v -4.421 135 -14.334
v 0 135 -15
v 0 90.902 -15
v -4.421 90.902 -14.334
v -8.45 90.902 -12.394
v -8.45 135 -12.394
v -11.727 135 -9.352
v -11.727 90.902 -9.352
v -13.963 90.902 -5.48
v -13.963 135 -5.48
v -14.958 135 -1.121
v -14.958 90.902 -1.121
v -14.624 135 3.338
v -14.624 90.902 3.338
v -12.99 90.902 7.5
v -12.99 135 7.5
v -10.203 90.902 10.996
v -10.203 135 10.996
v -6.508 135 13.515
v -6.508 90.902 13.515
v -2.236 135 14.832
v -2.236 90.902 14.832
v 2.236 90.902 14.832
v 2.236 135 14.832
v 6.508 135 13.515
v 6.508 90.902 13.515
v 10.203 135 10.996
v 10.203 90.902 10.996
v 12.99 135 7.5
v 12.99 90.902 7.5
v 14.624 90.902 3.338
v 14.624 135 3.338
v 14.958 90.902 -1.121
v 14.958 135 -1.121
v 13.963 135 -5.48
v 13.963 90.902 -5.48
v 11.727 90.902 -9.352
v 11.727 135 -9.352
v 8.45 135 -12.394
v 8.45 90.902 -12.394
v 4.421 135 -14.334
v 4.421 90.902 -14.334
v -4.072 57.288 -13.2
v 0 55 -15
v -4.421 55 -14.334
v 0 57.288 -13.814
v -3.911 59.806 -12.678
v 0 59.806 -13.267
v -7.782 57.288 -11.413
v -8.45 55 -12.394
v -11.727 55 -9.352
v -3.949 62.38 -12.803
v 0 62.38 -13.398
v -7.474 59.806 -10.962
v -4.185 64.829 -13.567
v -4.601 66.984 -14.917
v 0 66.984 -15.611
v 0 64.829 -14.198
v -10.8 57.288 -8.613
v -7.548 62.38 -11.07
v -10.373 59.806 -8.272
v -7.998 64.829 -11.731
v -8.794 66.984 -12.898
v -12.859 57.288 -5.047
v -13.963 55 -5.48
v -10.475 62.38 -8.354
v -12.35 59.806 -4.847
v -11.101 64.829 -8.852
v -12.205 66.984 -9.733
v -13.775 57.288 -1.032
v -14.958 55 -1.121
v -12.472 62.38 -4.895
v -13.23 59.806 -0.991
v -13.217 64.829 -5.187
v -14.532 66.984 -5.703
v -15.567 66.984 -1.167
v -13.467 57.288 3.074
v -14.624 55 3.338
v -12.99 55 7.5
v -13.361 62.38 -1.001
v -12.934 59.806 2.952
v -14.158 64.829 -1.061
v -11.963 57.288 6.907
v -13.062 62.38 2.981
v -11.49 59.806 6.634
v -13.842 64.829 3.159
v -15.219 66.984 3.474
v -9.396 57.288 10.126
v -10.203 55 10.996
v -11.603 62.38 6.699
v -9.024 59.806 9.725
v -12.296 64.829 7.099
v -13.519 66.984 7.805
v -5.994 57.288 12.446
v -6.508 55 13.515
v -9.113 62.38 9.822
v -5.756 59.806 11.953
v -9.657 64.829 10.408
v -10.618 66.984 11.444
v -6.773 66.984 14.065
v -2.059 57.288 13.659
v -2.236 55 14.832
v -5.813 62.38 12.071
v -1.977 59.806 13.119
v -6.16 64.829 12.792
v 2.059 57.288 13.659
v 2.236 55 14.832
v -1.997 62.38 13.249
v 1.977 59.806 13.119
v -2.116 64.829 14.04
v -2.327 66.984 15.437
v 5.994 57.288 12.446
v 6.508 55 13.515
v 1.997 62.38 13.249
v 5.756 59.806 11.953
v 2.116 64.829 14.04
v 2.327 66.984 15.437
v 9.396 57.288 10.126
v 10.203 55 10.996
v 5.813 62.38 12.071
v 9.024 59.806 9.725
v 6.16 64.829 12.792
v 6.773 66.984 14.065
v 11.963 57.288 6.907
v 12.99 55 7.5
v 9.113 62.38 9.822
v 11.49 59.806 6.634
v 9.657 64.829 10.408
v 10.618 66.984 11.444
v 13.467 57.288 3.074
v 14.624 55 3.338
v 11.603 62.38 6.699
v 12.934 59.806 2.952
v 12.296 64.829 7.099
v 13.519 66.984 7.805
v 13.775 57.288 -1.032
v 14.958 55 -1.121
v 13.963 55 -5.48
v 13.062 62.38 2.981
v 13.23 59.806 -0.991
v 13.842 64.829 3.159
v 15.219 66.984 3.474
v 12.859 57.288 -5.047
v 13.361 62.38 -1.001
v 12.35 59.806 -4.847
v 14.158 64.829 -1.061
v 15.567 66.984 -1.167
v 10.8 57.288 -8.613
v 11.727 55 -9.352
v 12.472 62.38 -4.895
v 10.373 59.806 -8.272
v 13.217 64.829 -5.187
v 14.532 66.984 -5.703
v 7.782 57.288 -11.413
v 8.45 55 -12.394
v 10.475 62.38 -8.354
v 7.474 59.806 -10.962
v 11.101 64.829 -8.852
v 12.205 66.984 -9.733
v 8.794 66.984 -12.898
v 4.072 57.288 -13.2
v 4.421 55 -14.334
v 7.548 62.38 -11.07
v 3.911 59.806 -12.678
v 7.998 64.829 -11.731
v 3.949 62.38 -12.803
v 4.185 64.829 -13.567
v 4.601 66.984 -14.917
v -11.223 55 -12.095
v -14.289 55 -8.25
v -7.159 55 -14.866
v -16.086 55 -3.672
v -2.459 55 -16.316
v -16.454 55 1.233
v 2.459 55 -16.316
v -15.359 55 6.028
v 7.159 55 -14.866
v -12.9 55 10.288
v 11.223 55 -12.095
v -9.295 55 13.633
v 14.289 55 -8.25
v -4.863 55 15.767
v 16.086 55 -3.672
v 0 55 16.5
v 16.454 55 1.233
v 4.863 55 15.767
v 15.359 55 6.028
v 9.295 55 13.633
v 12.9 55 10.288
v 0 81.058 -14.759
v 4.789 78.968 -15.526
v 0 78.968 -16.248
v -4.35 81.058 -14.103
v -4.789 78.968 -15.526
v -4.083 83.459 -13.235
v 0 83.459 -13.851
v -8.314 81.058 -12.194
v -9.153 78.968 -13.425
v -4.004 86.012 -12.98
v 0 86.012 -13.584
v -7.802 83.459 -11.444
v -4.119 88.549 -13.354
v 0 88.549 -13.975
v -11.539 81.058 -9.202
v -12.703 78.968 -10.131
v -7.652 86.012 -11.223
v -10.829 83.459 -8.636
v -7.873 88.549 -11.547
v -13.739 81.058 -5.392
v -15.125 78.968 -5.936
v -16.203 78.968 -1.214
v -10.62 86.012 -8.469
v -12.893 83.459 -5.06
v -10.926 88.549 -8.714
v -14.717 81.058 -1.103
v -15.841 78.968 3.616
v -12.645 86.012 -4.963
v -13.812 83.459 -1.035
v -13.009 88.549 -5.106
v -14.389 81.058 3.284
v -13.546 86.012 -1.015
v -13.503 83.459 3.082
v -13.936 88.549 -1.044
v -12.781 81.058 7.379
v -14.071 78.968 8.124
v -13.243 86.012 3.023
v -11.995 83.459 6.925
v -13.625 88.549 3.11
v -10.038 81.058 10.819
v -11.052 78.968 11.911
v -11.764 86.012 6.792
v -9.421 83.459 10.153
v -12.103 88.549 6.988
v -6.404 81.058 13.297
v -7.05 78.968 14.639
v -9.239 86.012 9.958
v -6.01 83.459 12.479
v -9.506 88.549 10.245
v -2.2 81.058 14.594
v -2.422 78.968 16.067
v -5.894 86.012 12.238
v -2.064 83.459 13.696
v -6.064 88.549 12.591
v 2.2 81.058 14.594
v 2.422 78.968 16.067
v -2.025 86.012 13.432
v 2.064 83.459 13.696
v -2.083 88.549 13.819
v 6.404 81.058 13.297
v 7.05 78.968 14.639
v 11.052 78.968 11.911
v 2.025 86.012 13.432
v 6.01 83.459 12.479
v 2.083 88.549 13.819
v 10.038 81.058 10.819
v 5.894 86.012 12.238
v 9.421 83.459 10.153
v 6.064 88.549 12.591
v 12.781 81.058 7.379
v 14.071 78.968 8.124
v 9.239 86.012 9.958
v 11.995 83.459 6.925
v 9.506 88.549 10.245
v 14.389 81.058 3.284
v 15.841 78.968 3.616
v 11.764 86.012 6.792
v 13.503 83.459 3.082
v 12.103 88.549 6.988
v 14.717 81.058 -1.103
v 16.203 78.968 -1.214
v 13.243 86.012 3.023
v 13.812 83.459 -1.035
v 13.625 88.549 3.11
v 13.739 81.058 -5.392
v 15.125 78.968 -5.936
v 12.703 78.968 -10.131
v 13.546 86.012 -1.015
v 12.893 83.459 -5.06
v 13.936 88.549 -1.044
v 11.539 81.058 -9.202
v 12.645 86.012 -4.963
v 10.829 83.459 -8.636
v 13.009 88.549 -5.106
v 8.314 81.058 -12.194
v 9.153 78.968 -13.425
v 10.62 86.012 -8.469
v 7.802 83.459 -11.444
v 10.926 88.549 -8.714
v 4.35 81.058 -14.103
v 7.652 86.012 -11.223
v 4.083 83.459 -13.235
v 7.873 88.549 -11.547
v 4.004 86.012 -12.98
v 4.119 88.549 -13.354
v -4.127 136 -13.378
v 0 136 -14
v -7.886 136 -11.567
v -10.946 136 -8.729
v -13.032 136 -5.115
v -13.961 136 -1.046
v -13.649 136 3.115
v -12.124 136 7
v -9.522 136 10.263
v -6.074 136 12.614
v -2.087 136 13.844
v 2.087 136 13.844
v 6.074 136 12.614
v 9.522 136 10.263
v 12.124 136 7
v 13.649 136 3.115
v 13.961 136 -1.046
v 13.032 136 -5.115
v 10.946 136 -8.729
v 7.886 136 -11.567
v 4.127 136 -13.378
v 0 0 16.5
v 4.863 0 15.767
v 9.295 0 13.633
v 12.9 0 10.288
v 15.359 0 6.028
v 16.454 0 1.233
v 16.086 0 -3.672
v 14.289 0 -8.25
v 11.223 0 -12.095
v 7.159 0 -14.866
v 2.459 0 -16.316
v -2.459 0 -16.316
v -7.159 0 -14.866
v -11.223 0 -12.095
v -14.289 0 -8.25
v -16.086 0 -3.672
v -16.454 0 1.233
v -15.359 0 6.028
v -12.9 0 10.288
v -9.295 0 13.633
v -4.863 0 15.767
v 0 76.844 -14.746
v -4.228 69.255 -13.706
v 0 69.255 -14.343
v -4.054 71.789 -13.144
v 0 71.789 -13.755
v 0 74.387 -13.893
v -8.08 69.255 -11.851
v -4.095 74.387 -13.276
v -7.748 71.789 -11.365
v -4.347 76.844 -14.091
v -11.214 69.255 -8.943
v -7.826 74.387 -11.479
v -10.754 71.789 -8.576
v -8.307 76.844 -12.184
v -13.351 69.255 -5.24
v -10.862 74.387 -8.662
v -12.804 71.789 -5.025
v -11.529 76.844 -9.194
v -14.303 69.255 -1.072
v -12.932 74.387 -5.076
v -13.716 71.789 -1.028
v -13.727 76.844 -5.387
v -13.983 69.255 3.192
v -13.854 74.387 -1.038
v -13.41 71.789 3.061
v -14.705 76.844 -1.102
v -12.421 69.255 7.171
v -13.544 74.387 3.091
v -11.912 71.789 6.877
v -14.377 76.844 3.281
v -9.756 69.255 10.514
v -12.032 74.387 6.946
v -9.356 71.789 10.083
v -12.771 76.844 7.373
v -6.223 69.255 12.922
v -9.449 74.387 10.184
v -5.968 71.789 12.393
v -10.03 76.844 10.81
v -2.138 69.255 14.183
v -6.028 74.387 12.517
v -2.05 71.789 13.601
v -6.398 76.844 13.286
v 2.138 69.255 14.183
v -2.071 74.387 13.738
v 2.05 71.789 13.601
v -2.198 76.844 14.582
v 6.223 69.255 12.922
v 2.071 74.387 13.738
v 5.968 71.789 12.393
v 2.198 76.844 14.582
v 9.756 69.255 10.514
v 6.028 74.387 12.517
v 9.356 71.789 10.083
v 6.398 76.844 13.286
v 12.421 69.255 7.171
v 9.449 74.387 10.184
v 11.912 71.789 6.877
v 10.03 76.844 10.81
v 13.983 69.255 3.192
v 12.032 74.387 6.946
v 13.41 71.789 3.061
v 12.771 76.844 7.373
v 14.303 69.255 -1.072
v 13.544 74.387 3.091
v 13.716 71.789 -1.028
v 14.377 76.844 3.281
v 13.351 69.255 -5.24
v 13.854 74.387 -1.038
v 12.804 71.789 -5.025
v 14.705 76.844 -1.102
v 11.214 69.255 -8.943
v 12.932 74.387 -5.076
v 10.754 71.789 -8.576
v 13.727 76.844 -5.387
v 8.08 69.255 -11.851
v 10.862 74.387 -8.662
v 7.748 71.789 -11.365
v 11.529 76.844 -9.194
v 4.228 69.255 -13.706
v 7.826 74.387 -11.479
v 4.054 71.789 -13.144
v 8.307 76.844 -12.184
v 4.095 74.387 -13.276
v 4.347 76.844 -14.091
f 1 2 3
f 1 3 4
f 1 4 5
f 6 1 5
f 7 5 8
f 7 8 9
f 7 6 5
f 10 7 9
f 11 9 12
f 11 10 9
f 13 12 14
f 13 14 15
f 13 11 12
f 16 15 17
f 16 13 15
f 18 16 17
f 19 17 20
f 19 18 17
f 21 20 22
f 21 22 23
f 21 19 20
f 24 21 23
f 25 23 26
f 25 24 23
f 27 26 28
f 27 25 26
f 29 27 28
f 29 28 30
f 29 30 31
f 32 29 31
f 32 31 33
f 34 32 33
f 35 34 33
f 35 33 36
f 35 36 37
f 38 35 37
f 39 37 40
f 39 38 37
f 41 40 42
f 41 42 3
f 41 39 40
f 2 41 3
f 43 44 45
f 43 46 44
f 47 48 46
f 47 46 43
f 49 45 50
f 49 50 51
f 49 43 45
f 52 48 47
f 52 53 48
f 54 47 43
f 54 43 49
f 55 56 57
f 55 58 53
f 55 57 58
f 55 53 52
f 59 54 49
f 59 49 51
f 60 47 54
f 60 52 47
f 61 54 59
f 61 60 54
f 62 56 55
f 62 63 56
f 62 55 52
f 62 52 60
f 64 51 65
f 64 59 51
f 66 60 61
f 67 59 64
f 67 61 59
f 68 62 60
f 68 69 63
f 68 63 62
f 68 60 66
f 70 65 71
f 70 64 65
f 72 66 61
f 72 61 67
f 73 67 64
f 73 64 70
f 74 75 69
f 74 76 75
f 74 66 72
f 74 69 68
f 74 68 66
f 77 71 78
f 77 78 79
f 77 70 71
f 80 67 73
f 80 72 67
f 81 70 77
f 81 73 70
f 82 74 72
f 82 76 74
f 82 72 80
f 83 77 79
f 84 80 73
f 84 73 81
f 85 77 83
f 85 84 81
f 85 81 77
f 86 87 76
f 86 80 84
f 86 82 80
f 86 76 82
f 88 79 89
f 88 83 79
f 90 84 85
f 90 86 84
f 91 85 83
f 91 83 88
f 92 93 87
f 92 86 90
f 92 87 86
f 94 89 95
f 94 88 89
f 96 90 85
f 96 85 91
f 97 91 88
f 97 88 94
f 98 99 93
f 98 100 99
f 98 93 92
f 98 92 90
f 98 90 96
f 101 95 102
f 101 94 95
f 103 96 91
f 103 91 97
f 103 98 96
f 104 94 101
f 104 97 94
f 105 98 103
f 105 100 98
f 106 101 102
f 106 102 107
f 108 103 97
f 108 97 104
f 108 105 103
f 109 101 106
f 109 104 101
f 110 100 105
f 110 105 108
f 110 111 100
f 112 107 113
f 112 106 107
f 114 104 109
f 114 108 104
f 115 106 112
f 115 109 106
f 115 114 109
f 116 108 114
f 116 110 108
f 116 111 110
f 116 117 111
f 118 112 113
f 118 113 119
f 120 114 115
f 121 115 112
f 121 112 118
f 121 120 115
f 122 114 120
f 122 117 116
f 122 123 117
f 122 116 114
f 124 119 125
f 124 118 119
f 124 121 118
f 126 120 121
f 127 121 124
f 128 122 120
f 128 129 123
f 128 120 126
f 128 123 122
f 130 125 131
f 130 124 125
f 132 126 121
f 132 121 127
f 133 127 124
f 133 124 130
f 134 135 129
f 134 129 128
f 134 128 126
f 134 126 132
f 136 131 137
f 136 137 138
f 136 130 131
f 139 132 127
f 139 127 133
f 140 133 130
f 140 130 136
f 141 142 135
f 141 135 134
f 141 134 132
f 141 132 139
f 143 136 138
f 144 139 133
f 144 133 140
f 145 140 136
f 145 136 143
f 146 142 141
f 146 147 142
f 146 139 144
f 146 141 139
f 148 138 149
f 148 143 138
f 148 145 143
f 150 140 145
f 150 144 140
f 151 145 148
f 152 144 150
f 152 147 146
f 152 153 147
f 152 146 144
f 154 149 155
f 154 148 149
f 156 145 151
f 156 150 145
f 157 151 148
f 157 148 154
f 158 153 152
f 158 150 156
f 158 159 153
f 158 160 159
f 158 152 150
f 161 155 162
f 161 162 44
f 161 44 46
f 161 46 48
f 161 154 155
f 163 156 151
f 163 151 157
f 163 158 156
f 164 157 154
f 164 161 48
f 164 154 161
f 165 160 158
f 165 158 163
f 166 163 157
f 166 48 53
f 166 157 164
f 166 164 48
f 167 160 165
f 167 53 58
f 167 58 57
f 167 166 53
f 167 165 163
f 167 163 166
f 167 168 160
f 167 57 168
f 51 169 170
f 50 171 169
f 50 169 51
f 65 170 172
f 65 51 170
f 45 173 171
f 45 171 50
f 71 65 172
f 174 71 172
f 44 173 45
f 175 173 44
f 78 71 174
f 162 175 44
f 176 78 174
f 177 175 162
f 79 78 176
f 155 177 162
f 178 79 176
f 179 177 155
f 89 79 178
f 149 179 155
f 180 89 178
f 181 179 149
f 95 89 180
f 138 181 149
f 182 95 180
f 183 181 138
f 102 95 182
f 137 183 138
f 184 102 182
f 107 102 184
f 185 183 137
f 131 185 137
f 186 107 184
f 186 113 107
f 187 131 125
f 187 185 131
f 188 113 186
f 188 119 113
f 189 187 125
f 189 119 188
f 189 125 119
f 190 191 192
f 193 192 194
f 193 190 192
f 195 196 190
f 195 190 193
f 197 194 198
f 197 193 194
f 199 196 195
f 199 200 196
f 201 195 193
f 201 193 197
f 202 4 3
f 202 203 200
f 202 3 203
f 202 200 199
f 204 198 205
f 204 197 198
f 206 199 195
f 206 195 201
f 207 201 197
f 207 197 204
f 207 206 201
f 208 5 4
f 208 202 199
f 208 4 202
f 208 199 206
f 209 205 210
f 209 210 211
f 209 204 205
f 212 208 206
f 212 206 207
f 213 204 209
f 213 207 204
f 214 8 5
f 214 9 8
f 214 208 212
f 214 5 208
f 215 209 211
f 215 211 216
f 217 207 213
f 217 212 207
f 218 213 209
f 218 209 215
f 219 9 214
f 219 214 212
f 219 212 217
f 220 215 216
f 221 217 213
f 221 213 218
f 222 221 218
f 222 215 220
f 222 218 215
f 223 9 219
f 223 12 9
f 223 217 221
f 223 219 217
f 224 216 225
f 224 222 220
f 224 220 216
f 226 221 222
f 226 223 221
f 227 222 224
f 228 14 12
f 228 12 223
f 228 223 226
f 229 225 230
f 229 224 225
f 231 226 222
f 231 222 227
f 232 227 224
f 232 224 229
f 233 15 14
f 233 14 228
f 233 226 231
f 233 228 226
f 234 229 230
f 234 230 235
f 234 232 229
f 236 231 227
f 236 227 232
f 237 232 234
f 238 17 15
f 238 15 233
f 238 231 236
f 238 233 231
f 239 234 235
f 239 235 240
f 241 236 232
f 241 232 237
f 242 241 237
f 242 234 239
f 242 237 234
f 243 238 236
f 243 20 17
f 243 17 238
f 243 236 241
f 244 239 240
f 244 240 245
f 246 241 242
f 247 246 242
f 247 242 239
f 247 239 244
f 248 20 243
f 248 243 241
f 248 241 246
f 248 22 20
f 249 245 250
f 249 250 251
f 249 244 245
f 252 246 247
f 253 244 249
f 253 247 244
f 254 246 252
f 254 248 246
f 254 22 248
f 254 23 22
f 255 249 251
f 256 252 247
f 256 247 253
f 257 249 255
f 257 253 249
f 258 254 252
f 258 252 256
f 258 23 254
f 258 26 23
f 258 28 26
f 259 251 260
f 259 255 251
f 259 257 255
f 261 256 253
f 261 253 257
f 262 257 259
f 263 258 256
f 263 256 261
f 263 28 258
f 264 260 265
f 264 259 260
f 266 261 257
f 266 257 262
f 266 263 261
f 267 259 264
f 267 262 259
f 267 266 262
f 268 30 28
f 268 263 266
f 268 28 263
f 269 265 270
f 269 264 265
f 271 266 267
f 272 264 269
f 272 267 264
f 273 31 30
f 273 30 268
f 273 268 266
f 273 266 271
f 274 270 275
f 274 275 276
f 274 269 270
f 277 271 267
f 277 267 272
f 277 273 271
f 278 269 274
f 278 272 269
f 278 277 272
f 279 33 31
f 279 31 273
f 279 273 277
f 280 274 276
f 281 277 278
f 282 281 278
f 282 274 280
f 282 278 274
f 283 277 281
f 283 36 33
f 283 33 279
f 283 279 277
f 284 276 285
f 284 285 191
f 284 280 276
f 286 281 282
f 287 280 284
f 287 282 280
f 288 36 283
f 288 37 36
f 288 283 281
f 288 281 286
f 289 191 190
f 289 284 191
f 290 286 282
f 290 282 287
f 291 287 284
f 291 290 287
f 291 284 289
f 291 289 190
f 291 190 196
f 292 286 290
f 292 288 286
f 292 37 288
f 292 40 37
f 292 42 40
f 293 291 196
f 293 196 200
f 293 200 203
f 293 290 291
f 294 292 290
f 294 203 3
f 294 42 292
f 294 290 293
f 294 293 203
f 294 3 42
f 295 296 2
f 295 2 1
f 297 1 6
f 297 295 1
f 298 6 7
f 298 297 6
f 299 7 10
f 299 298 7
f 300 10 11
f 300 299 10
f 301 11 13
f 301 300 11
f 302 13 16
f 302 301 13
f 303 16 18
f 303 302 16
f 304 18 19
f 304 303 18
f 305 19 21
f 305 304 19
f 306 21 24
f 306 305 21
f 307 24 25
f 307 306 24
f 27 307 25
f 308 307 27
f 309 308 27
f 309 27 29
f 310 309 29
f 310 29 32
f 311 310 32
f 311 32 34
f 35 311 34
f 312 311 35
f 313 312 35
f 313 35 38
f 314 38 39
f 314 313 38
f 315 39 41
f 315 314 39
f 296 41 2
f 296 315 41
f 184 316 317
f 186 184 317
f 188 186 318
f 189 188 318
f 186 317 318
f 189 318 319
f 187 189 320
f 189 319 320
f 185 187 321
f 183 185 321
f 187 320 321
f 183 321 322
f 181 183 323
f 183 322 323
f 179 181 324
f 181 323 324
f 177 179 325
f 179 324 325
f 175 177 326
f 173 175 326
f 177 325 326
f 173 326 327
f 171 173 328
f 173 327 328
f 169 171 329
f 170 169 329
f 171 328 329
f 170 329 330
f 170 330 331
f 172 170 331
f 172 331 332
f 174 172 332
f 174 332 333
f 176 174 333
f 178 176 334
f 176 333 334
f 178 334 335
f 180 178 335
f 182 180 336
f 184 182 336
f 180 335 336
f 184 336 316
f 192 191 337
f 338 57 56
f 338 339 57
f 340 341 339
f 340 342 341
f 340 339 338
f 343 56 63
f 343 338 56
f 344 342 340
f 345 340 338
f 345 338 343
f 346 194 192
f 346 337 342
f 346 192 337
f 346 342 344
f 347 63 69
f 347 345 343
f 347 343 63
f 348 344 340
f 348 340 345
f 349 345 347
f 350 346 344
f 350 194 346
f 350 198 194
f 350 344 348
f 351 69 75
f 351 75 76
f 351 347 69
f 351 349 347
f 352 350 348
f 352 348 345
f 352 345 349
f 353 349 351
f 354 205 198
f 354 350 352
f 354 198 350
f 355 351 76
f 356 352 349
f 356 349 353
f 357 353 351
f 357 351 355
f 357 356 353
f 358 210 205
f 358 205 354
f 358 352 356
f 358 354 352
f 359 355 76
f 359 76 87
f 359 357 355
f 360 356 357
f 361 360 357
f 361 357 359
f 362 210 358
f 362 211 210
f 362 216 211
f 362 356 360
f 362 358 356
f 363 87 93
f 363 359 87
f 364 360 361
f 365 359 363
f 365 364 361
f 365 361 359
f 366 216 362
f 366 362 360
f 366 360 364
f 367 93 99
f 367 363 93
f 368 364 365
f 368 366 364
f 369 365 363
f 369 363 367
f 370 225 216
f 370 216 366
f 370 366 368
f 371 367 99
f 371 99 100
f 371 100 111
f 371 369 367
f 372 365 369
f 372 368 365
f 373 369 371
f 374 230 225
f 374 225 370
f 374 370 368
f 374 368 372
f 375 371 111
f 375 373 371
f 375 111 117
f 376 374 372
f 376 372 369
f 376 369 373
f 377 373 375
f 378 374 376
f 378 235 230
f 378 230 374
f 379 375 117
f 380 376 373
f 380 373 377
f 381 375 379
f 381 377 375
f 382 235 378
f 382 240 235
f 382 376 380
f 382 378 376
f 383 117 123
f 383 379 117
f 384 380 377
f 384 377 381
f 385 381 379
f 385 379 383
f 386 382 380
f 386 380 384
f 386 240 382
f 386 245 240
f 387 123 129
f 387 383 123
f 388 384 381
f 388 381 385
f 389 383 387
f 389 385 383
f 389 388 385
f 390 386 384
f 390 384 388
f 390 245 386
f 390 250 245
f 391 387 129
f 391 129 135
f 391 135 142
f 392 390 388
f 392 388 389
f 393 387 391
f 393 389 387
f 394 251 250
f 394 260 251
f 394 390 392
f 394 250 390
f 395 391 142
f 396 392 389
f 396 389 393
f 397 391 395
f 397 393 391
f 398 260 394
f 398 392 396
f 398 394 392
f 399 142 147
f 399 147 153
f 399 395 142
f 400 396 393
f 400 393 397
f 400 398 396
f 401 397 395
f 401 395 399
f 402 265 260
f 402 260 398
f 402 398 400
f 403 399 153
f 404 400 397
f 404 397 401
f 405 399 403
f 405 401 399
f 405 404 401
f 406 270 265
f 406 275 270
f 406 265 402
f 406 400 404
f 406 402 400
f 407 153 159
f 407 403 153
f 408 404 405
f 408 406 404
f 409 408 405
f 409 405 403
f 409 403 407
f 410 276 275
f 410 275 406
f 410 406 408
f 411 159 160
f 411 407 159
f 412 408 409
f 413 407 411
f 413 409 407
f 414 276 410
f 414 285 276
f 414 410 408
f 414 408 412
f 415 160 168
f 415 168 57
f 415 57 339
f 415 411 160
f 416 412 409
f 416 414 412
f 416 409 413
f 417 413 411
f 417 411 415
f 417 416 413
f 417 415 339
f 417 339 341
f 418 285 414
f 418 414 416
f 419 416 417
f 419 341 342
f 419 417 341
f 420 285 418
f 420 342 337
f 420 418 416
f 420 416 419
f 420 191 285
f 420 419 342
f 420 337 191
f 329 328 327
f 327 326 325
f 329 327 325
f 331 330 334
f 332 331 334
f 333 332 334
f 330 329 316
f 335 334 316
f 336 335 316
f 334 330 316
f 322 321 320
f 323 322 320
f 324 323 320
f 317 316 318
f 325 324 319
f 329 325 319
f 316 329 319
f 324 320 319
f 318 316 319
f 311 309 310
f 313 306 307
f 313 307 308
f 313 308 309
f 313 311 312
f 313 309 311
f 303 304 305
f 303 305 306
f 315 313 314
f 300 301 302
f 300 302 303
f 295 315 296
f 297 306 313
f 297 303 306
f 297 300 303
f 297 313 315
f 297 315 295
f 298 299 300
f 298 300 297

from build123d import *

# Parameters (mm, degrees)
ESQUISSE1_R        = 16.5
BOSS_EXTRU_1_DEPTH = 55
CHANFREIN1_SIZE    = 1


with BuildPart() as part:
    # Esquisse1 → Boss.-Extru.1 (new body)
    with BuildSketch(Plane(origin=(0, 0, 0), x_dir=(1, 0, 0), z_dir=(0, 1, 0))):
        with Locations(Location((0, 0, 0), (0, 0, 270))):  # turned: the seam where the file's is
            Circle(ESQUISSE1_R)
    extrude(amount=BOSS_EXTRU_1_DEPTH)

    # Esquisse4 → Révolution1 (revolve)
    with BuildSketch(Plane.XY, mode=Mode.PRIVATE) as r_volution1_sk:
        with BuildLine():
            Line((0, 55), (15, 55))
            ThreePointArc((15, 55), (13.247417463, 61.097125593), (15.610891732, 66.984440383))
            ThreePointArc((15.610891732, 66.984440383), (13.732283635, 73.092812528), (16.248093706, 78.967510676))
            ThreePointArc((16.248093706, 78.967510676), (13.634893892, 84.726953942), (15, 90.902428443))
            Line((15, 90.902428443), (15, 136))
            Line((15, 136), (0, 136))
            Line((0, 136), (0, 55))
        make_face()
    revolve(r_volution1_sk.sketch.rotate(Axis((0, 55, 0), (0, 1, 0)), 90), axis=Axis((0, 55, 0), (0, 1, 0)))  # turned: the seam where the file's is

    # Chanfrein1
    chanfrein1_edges = [part.edges().sort_by_distance(p)[0] for p in [
        (0, 136, 15),
    ]]
    chamfer(chanfrein1_edges, length=CHANFREIN1_SIZE)


solid = part.part
